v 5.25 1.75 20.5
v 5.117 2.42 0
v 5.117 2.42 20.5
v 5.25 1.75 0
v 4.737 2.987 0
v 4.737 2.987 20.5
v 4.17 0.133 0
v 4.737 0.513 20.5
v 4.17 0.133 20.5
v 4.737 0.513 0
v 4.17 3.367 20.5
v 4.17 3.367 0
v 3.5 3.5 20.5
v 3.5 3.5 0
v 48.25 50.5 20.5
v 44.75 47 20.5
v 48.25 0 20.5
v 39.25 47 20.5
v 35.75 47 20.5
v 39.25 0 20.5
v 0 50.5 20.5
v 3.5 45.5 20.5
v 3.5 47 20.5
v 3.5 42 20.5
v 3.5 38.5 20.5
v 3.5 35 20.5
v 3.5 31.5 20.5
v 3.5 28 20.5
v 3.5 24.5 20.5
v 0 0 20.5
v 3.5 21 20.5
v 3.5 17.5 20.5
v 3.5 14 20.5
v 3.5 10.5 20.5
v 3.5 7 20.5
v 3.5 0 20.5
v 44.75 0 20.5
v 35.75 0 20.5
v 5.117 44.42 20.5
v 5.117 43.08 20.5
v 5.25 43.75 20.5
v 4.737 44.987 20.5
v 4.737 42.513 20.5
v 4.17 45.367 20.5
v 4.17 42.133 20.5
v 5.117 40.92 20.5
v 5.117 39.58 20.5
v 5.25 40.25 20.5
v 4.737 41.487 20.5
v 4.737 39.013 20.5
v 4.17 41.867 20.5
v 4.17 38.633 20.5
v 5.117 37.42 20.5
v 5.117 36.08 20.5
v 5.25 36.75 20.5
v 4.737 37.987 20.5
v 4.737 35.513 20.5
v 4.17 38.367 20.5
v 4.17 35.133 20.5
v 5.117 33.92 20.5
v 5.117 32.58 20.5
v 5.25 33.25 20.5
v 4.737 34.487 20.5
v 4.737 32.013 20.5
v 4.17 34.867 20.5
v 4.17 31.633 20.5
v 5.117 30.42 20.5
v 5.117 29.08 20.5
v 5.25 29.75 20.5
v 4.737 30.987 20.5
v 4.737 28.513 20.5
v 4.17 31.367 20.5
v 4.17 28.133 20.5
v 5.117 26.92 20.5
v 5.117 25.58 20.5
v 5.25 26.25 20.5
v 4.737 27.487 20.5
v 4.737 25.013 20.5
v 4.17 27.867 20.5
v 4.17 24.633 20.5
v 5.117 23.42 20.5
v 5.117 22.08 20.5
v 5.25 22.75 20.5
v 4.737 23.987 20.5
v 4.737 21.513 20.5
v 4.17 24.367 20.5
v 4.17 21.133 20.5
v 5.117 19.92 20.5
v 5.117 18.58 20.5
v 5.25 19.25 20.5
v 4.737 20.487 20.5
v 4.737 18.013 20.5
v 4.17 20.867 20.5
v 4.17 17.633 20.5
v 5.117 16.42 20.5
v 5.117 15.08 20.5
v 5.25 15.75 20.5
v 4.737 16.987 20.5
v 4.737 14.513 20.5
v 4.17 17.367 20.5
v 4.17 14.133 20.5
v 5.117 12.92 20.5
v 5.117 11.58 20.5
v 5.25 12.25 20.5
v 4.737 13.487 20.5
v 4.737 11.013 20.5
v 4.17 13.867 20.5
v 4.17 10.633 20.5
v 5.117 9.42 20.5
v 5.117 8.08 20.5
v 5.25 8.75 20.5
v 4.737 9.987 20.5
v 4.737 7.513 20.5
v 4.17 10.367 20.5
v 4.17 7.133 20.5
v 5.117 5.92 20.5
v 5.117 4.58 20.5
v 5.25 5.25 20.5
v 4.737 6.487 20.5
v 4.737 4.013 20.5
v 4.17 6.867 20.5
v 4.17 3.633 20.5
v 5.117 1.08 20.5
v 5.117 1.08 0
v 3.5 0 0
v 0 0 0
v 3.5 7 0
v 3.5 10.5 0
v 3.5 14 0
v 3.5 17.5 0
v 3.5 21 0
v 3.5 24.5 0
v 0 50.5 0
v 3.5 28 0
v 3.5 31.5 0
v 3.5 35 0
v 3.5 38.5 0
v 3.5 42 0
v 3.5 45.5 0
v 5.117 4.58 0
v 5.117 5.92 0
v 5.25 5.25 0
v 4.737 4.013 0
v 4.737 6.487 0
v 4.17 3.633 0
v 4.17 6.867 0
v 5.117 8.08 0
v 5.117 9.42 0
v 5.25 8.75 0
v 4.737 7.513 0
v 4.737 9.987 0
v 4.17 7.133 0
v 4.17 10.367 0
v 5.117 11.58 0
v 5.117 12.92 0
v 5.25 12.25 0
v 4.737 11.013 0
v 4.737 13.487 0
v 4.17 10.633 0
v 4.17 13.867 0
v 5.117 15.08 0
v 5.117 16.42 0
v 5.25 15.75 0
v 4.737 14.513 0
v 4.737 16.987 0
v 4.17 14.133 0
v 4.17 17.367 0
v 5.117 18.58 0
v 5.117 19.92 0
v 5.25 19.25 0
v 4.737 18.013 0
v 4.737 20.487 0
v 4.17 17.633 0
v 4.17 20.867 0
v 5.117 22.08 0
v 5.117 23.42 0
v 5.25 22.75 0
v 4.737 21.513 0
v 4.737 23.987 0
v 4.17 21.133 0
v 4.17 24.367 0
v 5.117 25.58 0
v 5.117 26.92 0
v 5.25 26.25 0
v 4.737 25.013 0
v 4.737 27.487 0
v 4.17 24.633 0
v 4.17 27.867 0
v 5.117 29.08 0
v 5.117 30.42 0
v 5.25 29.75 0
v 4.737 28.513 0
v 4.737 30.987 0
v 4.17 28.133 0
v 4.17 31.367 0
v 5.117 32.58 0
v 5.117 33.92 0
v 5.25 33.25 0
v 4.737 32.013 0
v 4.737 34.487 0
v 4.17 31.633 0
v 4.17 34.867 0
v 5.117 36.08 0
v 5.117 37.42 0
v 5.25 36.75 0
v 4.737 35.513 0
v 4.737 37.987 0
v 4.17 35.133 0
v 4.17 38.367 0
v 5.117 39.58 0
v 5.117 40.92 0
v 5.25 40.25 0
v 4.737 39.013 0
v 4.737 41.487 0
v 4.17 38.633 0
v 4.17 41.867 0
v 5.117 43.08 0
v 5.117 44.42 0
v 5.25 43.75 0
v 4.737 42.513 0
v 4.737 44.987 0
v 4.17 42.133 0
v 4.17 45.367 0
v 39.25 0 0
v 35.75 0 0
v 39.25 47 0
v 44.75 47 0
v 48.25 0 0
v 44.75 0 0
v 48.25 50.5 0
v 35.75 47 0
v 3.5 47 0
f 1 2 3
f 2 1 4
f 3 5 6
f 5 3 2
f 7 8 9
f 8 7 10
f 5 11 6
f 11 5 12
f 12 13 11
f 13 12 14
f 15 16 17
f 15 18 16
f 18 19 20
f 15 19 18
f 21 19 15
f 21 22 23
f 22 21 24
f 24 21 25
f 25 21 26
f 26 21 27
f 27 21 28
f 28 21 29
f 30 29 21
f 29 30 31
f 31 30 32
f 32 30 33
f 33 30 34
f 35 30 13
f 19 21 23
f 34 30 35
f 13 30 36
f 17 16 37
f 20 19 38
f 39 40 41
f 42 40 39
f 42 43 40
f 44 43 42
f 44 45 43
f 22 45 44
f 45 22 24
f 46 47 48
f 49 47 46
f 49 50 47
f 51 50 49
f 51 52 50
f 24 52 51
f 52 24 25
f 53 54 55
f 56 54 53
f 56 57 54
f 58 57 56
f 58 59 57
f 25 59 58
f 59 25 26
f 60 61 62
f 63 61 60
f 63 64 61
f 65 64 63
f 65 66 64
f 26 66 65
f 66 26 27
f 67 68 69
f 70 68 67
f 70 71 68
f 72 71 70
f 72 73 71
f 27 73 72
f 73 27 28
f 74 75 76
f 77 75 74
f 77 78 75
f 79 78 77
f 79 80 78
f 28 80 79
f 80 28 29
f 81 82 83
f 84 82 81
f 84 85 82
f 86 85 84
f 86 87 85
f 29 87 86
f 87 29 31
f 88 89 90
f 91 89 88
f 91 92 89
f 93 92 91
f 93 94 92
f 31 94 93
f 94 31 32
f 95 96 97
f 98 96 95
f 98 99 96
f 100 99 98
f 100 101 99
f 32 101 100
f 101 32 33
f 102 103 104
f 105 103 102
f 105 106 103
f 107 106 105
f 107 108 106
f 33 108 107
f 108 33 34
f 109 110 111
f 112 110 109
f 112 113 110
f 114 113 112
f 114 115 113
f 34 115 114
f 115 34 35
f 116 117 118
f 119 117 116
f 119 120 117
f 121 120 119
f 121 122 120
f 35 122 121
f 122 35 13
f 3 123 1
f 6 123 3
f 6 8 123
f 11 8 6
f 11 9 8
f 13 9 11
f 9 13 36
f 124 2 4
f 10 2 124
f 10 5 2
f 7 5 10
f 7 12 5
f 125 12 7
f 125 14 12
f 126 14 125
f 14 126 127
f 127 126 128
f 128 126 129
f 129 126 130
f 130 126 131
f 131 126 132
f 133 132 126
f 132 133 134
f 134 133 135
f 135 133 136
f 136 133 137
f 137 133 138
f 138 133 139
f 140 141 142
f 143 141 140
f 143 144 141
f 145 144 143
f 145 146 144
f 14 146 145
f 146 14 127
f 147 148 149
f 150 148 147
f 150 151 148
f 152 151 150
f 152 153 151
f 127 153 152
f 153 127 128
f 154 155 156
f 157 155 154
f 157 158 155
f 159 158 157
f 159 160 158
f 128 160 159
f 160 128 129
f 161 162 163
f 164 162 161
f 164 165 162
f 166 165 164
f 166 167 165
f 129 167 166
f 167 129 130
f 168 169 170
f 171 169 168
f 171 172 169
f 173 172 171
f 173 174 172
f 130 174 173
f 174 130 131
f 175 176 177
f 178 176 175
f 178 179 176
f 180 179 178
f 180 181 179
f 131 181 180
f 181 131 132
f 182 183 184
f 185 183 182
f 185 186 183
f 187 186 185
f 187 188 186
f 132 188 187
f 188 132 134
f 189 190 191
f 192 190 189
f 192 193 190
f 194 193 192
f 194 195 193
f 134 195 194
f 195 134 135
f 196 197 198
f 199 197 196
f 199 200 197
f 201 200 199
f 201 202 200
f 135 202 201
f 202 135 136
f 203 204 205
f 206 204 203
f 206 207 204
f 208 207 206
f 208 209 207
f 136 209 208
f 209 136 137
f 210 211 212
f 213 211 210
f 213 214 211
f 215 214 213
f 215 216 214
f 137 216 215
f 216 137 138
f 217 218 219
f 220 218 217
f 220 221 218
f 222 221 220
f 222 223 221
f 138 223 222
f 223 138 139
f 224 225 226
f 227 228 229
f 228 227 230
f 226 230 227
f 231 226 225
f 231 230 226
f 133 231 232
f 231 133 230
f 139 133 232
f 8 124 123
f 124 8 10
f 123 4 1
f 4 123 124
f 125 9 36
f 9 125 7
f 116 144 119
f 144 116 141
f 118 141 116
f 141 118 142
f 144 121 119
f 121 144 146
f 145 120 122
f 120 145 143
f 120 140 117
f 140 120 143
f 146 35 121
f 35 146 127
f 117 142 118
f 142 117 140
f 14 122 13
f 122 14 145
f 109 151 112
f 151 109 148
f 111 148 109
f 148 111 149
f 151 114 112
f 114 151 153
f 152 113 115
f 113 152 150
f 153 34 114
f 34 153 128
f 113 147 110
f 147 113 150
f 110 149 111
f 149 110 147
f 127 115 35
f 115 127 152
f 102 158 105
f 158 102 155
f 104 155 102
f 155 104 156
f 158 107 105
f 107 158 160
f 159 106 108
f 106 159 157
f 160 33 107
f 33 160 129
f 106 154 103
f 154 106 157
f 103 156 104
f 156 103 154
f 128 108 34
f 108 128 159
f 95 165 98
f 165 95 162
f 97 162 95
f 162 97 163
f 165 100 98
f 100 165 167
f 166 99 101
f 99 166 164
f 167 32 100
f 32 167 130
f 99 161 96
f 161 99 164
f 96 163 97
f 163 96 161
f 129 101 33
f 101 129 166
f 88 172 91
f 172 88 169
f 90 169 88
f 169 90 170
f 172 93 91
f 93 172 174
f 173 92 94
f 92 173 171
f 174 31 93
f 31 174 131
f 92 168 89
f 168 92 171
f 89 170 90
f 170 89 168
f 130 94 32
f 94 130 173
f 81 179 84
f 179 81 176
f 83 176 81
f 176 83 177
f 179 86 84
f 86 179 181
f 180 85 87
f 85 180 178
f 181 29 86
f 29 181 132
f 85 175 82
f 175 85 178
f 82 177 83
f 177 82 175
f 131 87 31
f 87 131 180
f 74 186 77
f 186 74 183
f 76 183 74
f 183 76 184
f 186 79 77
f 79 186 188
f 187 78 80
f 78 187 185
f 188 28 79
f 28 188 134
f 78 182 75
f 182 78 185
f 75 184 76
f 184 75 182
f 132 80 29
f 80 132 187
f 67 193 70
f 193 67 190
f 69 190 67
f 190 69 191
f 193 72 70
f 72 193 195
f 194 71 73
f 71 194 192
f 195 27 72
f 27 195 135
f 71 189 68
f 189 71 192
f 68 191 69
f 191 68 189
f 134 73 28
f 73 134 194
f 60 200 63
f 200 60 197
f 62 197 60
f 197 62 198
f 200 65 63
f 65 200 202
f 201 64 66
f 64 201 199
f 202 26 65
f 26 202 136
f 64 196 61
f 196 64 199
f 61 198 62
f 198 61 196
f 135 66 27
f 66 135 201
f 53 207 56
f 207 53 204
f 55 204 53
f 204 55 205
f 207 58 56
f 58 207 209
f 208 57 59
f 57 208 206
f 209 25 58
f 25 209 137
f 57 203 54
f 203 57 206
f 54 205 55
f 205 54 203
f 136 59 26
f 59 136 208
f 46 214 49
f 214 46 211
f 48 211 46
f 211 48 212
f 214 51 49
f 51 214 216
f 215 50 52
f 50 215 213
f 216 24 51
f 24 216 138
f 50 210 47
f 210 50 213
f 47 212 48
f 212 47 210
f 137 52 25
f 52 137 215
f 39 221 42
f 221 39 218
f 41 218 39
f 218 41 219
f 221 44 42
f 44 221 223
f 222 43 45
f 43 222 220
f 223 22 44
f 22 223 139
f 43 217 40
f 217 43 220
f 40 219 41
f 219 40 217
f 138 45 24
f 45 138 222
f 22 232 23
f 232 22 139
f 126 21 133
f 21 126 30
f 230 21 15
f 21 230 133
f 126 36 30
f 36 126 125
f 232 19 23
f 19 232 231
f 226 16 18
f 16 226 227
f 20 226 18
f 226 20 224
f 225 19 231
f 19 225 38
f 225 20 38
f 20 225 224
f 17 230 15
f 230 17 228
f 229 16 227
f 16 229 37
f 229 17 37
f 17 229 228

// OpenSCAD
//CUSTOMIZER VARIABLES
//	Width of the clip
width = 20.5;

//	Height of the clip
height = 50.5;

//	Thickness of the clip
thickness = 3.5; // [spinbox:1.0:0.1:10]

//	Width of the first gap on the clip
gap1 = 30.5; // [spinbox:0.1:0.1:30]

//	Width of the second gap on the clip
gap2 = 5.5; // [spinbox:0.1:0.1:30]
//CUSTOMIZER VARIABLES END

//E-CLIP
module zclip(w,h,t,d1,d2) {
    d1=d1+t/2;
	cube([t,h,w]);
	translate([t,h-t,0]) cube([d1+t,t,w]);
	translate([d1+t,0,0]) cube([t,h-t,w]);
	translate([d1+t+t,h-t,0]) cube([d2+t,t,w]);
	translate([d1+t+t+d2,0,0]) cube([t,h-t,w]);
    // Cylinders
    for (i = [0: t : h-t*2]){
        translate([t, i+t/2, 0])
            cylinder(h = w, d=t, $fn=16);
    }
}
zclip(width,height,thickness,gap1,gap2);
//Z-CLIP END
